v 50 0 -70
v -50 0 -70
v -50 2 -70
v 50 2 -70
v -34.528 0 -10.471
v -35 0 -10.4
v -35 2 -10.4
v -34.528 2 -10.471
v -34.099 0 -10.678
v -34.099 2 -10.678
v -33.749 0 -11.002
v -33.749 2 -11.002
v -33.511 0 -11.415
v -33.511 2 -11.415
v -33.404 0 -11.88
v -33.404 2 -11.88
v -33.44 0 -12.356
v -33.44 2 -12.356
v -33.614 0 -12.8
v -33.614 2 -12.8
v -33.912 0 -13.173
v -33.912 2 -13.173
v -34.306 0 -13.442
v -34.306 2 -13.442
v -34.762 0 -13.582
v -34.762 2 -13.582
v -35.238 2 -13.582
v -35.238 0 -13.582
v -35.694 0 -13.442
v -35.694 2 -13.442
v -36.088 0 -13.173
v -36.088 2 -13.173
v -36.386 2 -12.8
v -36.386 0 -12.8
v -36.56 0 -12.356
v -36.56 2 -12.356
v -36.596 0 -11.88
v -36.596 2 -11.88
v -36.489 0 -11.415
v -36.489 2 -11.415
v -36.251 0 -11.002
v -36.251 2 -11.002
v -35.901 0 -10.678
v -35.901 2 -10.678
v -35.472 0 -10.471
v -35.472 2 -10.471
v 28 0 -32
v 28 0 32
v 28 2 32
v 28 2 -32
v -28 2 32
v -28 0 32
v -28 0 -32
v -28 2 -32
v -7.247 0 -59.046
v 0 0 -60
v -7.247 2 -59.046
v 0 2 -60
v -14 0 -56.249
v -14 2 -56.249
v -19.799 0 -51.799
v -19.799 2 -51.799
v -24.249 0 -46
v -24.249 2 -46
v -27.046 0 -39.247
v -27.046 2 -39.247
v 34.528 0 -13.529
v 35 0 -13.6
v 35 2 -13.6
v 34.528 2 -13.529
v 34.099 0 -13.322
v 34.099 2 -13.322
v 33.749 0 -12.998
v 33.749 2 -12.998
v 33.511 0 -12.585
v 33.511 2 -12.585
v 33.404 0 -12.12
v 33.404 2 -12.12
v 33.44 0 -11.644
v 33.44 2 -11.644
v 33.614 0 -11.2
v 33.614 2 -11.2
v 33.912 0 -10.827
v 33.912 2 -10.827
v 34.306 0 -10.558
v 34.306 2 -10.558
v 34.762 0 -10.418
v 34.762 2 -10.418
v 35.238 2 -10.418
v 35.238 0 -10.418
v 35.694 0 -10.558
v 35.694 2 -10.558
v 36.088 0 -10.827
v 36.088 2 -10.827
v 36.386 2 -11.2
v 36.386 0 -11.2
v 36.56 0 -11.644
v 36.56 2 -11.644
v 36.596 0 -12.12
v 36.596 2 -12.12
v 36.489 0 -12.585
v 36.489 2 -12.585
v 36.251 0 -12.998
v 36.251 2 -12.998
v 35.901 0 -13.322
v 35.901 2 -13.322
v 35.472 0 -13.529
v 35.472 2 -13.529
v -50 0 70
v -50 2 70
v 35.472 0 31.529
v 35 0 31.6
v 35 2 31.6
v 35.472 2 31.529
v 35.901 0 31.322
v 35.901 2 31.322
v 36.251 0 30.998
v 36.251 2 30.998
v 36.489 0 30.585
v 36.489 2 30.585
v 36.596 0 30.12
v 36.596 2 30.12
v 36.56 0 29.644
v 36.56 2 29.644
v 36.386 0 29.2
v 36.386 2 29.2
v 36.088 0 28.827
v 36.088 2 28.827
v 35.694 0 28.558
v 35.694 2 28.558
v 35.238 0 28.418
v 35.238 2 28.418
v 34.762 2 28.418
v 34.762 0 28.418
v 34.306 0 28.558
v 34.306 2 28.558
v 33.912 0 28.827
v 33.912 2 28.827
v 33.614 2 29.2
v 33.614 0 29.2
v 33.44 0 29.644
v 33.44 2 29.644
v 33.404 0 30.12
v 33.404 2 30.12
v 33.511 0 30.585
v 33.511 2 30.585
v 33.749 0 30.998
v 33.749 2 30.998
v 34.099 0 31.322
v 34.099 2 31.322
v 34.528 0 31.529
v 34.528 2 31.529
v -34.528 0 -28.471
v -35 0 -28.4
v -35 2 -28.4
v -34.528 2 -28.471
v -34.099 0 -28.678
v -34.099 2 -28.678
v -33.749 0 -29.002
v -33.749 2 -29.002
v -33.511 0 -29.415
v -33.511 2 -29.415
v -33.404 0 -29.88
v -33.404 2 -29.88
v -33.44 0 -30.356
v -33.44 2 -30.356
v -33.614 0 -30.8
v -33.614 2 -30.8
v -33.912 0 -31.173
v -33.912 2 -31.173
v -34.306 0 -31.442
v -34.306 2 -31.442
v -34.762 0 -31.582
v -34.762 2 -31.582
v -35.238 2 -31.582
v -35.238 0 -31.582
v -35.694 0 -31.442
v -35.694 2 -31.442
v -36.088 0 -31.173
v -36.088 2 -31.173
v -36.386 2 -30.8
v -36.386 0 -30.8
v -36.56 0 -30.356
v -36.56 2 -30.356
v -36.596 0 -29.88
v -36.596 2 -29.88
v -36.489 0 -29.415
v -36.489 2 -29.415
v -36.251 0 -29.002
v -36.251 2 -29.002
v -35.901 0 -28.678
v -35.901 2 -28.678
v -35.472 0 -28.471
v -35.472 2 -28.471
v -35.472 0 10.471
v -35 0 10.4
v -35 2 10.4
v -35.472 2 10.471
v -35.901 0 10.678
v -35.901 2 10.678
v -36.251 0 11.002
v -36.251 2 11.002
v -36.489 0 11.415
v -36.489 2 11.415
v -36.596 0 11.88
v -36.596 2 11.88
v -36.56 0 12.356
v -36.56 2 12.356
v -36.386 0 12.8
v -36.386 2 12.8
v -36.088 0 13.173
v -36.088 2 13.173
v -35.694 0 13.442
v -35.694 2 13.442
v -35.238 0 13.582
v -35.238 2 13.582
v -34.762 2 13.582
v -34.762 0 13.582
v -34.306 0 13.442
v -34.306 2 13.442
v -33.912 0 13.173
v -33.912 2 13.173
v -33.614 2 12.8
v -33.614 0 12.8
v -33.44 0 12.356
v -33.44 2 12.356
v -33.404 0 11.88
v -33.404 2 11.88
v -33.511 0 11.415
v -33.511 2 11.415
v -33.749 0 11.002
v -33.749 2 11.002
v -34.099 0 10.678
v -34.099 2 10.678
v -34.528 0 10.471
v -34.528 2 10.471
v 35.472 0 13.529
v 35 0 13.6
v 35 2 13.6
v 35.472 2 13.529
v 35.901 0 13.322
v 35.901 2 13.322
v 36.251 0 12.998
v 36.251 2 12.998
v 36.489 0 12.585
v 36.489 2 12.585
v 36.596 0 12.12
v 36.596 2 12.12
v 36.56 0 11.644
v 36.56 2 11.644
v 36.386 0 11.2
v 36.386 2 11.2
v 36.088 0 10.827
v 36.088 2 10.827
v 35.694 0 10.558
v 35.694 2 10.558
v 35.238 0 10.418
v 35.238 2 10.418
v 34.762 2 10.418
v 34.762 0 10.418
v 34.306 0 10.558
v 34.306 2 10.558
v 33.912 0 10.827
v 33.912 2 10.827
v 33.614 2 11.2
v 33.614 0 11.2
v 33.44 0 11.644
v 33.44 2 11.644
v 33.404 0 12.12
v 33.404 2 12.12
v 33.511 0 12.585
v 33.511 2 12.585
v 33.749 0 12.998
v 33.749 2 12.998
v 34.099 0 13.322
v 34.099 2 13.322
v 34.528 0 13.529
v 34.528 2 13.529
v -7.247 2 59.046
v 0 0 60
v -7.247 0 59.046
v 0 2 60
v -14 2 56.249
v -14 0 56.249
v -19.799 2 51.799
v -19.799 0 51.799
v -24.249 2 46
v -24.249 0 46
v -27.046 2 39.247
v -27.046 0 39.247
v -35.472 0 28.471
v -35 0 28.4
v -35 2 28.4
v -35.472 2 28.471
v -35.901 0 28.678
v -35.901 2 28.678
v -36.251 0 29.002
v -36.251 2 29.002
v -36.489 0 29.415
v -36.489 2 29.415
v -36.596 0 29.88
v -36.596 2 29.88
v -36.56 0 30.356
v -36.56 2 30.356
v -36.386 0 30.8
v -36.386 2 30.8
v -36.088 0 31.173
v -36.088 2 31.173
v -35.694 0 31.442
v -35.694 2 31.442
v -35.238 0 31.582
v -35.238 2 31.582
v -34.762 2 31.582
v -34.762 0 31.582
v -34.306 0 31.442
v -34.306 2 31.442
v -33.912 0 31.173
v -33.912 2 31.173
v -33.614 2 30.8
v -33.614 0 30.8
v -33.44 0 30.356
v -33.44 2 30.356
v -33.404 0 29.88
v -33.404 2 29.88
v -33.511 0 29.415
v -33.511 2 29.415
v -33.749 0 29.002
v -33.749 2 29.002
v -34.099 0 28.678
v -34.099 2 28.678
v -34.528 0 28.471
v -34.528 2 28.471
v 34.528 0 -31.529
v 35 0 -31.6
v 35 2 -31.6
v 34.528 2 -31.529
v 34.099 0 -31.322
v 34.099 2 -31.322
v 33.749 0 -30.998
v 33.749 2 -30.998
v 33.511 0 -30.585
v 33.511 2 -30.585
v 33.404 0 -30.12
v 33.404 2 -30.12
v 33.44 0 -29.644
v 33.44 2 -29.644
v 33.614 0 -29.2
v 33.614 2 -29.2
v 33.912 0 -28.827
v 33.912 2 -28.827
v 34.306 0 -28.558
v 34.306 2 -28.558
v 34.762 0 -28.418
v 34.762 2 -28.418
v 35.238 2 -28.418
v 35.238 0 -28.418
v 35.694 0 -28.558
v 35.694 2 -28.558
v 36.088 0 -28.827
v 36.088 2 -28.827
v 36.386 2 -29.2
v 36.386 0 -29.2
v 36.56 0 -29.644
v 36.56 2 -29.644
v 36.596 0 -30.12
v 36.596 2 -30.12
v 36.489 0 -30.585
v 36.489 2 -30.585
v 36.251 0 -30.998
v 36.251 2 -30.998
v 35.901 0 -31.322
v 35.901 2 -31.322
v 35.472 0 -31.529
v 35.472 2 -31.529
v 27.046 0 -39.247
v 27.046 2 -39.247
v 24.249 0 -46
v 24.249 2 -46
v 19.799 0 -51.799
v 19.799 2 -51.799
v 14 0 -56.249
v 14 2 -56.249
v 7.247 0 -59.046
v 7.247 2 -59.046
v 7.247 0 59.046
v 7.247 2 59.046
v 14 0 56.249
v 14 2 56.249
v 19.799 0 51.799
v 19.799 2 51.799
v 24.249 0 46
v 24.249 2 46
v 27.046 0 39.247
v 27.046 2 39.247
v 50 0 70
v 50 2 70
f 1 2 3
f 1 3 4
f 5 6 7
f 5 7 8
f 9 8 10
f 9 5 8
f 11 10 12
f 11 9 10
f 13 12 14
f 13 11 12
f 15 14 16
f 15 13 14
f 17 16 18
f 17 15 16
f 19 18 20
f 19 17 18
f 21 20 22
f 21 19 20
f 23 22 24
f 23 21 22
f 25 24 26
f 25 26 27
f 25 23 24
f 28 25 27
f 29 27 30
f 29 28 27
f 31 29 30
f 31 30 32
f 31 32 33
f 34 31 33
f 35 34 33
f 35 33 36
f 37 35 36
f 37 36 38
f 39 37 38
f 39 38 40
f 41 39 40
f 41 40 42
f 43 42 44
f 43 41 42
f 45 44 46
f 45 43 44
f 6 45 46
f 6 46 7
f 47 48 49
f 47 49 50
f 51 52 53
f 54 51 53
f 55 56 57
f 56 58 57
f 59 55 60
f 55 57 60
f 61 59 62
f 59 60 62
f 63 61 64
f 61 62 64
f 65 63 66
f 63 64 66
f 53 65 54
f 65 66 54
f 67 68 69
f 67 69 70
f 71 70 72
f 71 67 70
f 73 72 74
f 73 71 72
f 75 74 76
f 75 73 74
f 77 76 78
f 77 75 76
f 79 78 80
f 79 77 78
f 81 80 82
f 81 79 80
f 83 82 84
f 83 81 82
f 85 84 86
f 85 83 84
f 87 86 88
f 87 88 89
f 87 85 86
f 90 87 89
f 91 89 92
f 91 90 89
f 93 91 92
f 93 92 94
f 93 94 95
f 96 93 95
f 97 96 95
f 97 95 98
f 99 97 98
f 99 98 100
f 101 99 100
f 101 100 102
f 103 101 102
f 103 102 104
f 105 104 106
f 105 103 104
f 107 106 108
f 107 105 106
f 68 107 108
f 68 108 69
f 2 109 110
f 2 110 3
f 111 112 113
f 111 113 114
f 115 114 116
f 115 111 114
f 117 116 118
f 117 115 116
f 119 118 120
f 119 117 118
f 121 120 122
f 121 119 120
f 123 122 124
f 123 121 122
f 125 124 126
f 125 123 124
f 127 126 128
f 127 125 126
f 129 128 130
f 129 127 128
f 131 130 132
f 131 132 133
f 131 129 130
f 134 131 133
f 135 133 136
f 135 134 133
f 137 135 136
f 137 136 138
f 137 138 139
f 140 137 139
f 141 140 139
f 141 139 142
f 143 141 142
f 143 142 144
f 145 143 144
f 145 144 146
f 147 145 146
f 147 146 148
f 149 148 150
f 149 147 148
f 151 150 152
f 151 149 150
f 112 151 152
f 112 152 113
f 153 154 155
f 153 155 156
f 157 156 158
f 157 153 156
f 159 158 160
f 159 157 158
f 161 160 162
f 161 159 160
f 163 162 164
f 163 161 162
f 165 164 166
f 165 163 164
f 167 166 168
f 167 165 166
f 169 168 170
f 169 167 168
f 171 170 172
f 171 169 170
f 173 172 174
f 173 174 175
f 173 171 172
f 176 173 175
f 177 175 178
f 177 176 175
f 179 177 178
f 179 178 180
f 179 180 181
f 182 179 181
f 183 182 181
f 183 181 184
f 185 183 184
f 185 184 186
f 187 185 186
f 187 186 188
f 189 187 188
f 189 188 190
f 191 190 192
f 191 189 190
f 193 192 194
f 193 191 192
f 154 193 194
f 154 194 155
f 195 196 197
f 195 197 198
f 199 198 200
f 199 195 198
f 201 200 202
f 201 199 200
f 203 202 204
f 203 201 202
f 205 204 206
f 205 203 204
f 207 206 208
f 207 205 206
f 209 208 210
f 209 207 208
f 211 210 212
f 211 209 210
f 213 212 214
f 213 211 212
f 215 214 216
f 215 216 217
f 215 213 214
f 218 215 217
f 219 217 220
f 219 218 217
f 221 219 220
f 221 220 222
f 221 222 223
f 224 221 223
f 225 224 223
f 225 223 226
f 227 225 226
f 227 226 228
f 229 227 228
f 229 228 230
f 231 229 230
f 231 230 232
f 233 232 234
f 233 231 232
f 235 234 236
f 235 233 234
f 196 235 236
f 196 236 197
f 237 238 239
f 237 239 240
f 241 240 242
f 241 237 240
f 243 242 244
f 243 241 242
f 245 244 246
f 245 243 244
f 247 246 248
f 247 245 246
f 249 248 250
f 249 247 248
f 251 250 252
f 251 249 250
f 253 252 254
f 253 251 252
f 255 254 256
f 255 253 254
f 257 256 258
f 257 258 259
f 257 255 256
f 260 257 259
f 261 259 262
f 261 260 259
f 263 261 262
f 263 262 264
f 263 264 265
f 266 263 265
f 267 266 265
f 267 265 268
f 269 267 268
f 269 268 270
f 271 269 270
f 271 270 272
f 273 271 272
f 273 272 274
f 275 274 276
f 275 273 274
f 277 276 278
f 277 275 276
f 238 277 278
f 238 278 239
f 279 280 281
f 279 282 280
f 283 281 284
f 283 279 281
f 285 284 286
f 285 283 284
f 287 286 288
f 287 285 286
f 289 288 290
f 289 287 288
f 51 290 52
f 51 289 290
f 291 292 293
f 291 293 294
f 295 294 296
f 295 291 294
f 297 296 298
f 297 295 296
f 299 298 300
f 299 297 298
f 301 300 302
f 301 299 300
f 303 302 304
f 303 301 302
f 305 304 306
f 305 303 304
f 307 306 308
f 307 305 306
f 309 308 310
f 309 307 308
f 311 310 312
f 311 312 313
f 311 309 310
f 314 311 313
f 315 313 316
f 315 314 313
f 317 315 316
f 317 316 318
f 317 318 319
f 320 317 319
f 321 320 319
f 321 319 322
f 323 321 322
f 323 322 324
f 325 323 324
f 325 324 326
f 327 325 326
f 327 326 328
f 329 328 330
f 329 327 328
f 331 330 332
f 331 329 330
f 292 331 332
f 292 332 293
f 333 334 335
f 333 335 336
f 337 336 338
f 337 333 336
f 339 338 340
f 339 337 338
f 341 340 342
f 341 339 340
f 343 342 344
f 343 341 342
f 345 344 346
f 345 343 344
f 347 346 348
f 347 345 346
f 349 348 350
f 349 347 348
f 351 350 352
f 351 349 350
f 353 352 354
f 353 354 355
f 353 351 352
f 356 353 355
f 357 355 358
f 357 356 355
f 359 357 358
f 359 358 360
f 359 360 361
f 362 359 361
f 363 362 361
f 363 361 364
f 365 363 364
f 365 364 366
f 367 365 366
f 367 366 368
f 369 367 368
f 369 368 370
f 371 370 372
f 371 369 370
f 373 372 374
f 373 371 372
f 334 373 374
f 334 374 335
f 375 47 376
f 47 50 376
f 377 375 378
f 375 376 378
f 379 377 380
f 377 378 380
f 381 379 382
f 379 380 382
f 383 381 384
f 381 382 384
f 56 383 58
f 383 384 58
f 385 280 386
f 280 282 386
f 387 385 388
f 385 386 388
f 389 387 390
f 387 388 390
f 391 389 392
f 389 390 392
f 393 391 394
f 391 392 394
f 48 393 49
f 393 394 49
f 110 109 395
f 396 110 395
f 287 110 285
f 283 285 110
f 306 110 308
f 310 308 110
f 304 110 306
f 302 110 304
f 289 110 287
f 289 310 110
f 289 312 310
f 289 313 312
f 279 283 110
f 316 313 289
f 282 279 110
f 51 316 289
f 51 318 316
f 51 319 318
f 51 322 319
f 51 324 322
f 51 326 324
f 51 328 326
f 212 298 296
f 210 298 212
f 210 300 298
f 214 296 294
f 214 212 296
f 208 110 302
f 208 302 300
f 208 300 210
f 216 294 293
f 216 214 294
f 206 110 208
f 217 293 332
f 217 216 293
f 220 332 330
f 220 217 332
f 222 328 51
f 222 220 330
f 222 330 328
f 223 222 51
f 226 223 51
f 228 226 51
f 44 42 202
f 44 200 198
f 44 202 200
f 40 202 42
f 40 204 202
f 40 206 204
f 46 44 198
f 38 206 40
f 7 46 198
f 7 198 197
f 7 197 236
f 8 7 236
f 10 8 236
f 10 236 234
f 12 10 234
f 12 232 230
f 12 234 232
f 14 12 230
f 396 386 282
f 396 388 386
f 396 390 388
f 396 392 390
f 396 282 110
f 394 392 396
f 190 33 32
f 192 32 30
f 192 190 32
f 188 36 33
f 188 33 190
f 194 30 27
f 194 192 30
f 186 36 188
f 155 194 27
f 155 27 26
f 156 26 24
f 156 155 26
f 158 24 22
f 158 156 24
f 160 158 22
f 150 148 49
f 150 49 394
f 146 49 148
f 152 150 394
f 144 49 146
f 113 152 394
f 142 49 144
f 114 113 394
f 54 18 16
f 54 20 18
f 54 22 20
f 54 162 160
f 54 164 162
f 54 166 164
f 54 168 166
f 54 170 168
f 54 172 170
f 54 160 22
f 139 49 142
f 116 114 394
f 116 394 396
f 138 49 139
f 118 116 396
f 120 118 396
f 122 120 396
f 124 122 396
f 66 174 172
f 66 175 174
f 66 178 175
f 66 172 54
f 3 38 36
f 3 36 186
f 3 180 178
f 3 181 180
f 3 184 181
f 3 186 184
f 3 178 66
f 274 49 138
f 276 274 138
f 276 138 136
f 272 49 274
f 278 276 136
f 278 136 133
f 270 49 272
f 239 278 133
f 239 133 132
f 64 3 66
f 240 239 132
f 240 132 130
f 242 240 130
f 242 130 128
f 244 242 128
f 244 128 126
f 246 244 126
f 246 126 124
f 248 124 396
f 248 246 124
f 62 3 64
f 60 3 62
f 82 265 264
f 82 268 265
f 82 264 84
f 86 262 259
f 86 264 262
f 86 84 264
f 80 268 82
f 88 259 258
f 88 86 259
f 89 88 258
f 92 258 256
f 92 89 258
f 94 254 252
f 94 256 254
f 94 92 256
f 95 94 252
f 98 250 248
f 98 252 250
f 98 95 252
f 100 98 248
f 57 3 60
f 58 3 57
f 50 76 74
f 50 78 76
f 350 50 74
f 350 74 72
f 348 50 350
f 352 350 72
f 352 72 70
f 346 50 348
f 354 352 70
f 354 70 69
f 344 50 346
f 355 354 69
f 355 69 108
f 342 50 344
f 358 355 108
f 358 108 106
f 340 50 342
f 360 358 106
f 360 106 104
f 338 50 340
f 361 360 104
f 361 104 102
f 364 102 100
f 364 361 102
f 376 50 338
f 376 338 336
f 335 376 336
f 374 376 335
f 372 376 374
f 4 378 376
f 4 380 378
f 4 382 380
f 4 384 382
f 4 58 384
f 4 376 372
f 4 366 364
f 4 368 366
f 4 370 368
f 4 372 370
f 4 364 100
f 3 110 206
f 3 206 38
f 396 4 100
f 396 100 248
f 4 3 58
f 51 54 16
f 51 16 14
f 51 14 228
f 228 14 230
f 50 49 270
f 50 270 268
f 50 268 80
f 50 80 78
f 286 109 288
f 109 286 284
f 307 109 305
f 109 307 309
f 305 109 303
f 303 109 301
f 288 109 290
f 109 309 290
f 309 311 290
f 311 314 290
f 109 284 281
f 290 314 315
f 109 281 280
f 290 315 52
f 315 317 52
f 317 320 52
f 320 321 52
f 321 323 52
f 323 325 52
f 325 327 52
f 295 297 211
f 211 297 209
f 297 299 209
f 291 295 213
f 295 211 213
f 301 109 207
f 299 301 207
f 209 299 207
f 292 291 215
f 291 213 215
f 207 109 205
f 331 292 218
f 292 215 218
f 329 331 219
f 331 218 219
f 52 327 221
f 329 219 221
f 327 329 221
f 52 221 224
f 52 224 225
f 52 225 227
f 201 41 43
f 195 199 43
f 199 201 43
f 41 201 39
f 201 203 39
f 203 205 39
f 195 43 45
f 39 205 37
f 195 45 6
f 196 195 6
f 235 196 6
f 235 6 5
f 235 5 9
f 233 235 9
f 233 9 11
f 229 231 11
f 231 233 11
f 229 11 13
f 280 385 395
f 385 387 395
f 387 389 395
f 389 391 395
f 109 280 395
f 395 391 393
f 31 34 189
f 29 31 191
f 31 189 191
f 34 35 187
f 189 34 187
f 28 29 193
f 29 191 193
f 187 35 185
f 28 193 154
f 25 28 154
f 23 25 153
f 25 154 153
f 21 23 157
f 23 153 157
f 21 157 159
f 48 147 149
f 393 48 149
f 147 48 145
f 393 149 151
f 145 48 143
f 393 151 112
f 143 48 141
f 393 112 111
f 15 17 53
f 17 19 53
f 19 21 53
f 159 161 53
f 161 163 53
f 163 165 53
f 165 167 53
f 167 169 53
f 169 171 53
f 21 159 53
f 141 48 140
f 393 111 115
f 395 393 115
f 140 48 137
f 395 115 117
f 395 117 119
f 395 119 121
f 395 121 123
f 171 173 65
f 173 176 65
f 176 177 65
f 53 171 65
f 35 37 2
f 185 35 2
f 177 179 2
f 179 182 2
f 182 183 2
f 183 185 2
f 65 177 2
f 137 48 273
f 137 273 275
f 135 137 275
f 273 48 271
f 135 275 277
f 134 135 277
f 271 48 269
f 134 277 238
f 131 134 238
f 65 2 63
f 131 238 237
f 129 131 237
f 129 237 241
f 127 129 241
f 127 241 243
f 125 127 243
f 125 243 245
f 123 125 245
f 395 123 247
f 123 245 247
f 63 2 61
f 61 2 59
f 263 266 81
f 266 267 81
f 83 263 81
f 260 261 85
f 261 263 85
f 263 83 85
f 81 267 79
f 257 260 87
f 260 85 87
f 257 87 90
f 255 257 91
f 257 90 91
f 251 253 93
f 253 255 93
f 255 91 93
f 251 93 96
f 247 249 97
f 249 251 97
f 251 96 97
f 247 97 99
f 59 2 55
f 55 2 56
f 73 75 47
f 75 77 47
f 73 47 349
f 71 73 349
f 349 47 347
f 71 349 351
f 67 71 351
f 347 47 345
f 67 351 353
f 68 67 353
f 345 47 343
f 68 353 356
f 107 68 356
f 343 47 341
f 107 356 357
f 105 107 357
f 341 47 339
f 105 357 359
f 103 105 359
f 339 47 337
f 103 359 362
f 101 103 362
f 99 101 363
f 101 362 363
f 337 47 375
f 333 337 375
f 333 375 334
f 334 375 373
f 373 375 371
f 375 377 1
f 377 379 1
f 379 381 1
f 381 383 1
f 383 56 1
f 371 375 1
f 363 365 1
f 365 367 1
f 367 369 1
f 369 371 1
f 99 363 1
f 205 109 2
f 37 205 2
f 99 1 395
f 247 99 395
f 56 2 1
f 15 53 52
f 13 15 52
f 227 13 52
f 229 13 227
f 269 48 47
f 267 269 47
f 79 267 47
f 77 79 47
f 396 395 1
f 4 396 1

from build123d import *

# Parameters (mm, degrees)
SKETCH_1_W      = 100
SKETCH_1_H      = 140
SKETCH_1_R      = 1.6
SKETCH_1_W_2    = 56
SKETCH_1_H_2    = 120
EXTRUDE_1_DEPTH = 2
FILLET_1_R      = 28


with BuildPart() as part:
    # 草圖1 → 填料-伸長1 (new body)
    with BuildSketch(Plane(origin=(0, 0, 0), x_dir=(1, 0, 0), z_dir=(0, 1, 0))):
        Rectangle(SKETCH_1_W, SKETCH_1_H)
        with Locations(Location((-35, 30, 0), (0, 0, 270))):
            Circle(SKETCH_1_R, mode=Mode.SUBTRACT)
        with Locations(Location((35, 30, 0), (0, 0, 90))):
            Circle(SKETCH_1_R, mode=Mode.SUBTRACT)
        with Locations(Location((-35, 12, 0), (0, 0, 270))):
            Circle(SKETCH_1_R, mode=Mode.SUBTRACT)
        with Locations(Location((35, 12, 0), (0, 0, 90))):
            Circle(SKETCH_1_R, mode=Mode.SUBTRACT)
        with Locations(Location((35, -12, 0), (0, 0, 270))):
            Circle(SKETCH_1_R, mode=Mode.SUBTRACT)
        with Locations(Location((35, -30, 0), (0, 0, 270))):
            Circle(SKETCH_1_R, mode=Mode.SUBTRACT)
        with Locations(Location((-35, -30, 0), (0, 0, 90))):
            Circle(SKETCH_1_R, mode=Mode.SUBTRACT)
        with Locations(Location((-35, -12, 0), (0, 0, 90))):
            Circle(SKETCH_1_R, mode=Mode.SUBTRACT)
        Rectangle(SKETCH_1_W_2, SKETCH_1_H_2, mode=Mode.SUBTRACT)
    extrude(amount=EXTRUDE_1_DEPTH)

    # 圓角1
    fillet_1_edges = [part.edges().sort_by_distance(p)[0] for p in [
        (28, 1, -60),
        (-28, 1, -60),
        (-28, 1, 60),
        (28, 1, 60),
    ]]
    fillet(fillet_1_edges, radius=FILLET_1_R - 0.0001)  # a hair under: the kernel refuses the full size


solid = part.part
